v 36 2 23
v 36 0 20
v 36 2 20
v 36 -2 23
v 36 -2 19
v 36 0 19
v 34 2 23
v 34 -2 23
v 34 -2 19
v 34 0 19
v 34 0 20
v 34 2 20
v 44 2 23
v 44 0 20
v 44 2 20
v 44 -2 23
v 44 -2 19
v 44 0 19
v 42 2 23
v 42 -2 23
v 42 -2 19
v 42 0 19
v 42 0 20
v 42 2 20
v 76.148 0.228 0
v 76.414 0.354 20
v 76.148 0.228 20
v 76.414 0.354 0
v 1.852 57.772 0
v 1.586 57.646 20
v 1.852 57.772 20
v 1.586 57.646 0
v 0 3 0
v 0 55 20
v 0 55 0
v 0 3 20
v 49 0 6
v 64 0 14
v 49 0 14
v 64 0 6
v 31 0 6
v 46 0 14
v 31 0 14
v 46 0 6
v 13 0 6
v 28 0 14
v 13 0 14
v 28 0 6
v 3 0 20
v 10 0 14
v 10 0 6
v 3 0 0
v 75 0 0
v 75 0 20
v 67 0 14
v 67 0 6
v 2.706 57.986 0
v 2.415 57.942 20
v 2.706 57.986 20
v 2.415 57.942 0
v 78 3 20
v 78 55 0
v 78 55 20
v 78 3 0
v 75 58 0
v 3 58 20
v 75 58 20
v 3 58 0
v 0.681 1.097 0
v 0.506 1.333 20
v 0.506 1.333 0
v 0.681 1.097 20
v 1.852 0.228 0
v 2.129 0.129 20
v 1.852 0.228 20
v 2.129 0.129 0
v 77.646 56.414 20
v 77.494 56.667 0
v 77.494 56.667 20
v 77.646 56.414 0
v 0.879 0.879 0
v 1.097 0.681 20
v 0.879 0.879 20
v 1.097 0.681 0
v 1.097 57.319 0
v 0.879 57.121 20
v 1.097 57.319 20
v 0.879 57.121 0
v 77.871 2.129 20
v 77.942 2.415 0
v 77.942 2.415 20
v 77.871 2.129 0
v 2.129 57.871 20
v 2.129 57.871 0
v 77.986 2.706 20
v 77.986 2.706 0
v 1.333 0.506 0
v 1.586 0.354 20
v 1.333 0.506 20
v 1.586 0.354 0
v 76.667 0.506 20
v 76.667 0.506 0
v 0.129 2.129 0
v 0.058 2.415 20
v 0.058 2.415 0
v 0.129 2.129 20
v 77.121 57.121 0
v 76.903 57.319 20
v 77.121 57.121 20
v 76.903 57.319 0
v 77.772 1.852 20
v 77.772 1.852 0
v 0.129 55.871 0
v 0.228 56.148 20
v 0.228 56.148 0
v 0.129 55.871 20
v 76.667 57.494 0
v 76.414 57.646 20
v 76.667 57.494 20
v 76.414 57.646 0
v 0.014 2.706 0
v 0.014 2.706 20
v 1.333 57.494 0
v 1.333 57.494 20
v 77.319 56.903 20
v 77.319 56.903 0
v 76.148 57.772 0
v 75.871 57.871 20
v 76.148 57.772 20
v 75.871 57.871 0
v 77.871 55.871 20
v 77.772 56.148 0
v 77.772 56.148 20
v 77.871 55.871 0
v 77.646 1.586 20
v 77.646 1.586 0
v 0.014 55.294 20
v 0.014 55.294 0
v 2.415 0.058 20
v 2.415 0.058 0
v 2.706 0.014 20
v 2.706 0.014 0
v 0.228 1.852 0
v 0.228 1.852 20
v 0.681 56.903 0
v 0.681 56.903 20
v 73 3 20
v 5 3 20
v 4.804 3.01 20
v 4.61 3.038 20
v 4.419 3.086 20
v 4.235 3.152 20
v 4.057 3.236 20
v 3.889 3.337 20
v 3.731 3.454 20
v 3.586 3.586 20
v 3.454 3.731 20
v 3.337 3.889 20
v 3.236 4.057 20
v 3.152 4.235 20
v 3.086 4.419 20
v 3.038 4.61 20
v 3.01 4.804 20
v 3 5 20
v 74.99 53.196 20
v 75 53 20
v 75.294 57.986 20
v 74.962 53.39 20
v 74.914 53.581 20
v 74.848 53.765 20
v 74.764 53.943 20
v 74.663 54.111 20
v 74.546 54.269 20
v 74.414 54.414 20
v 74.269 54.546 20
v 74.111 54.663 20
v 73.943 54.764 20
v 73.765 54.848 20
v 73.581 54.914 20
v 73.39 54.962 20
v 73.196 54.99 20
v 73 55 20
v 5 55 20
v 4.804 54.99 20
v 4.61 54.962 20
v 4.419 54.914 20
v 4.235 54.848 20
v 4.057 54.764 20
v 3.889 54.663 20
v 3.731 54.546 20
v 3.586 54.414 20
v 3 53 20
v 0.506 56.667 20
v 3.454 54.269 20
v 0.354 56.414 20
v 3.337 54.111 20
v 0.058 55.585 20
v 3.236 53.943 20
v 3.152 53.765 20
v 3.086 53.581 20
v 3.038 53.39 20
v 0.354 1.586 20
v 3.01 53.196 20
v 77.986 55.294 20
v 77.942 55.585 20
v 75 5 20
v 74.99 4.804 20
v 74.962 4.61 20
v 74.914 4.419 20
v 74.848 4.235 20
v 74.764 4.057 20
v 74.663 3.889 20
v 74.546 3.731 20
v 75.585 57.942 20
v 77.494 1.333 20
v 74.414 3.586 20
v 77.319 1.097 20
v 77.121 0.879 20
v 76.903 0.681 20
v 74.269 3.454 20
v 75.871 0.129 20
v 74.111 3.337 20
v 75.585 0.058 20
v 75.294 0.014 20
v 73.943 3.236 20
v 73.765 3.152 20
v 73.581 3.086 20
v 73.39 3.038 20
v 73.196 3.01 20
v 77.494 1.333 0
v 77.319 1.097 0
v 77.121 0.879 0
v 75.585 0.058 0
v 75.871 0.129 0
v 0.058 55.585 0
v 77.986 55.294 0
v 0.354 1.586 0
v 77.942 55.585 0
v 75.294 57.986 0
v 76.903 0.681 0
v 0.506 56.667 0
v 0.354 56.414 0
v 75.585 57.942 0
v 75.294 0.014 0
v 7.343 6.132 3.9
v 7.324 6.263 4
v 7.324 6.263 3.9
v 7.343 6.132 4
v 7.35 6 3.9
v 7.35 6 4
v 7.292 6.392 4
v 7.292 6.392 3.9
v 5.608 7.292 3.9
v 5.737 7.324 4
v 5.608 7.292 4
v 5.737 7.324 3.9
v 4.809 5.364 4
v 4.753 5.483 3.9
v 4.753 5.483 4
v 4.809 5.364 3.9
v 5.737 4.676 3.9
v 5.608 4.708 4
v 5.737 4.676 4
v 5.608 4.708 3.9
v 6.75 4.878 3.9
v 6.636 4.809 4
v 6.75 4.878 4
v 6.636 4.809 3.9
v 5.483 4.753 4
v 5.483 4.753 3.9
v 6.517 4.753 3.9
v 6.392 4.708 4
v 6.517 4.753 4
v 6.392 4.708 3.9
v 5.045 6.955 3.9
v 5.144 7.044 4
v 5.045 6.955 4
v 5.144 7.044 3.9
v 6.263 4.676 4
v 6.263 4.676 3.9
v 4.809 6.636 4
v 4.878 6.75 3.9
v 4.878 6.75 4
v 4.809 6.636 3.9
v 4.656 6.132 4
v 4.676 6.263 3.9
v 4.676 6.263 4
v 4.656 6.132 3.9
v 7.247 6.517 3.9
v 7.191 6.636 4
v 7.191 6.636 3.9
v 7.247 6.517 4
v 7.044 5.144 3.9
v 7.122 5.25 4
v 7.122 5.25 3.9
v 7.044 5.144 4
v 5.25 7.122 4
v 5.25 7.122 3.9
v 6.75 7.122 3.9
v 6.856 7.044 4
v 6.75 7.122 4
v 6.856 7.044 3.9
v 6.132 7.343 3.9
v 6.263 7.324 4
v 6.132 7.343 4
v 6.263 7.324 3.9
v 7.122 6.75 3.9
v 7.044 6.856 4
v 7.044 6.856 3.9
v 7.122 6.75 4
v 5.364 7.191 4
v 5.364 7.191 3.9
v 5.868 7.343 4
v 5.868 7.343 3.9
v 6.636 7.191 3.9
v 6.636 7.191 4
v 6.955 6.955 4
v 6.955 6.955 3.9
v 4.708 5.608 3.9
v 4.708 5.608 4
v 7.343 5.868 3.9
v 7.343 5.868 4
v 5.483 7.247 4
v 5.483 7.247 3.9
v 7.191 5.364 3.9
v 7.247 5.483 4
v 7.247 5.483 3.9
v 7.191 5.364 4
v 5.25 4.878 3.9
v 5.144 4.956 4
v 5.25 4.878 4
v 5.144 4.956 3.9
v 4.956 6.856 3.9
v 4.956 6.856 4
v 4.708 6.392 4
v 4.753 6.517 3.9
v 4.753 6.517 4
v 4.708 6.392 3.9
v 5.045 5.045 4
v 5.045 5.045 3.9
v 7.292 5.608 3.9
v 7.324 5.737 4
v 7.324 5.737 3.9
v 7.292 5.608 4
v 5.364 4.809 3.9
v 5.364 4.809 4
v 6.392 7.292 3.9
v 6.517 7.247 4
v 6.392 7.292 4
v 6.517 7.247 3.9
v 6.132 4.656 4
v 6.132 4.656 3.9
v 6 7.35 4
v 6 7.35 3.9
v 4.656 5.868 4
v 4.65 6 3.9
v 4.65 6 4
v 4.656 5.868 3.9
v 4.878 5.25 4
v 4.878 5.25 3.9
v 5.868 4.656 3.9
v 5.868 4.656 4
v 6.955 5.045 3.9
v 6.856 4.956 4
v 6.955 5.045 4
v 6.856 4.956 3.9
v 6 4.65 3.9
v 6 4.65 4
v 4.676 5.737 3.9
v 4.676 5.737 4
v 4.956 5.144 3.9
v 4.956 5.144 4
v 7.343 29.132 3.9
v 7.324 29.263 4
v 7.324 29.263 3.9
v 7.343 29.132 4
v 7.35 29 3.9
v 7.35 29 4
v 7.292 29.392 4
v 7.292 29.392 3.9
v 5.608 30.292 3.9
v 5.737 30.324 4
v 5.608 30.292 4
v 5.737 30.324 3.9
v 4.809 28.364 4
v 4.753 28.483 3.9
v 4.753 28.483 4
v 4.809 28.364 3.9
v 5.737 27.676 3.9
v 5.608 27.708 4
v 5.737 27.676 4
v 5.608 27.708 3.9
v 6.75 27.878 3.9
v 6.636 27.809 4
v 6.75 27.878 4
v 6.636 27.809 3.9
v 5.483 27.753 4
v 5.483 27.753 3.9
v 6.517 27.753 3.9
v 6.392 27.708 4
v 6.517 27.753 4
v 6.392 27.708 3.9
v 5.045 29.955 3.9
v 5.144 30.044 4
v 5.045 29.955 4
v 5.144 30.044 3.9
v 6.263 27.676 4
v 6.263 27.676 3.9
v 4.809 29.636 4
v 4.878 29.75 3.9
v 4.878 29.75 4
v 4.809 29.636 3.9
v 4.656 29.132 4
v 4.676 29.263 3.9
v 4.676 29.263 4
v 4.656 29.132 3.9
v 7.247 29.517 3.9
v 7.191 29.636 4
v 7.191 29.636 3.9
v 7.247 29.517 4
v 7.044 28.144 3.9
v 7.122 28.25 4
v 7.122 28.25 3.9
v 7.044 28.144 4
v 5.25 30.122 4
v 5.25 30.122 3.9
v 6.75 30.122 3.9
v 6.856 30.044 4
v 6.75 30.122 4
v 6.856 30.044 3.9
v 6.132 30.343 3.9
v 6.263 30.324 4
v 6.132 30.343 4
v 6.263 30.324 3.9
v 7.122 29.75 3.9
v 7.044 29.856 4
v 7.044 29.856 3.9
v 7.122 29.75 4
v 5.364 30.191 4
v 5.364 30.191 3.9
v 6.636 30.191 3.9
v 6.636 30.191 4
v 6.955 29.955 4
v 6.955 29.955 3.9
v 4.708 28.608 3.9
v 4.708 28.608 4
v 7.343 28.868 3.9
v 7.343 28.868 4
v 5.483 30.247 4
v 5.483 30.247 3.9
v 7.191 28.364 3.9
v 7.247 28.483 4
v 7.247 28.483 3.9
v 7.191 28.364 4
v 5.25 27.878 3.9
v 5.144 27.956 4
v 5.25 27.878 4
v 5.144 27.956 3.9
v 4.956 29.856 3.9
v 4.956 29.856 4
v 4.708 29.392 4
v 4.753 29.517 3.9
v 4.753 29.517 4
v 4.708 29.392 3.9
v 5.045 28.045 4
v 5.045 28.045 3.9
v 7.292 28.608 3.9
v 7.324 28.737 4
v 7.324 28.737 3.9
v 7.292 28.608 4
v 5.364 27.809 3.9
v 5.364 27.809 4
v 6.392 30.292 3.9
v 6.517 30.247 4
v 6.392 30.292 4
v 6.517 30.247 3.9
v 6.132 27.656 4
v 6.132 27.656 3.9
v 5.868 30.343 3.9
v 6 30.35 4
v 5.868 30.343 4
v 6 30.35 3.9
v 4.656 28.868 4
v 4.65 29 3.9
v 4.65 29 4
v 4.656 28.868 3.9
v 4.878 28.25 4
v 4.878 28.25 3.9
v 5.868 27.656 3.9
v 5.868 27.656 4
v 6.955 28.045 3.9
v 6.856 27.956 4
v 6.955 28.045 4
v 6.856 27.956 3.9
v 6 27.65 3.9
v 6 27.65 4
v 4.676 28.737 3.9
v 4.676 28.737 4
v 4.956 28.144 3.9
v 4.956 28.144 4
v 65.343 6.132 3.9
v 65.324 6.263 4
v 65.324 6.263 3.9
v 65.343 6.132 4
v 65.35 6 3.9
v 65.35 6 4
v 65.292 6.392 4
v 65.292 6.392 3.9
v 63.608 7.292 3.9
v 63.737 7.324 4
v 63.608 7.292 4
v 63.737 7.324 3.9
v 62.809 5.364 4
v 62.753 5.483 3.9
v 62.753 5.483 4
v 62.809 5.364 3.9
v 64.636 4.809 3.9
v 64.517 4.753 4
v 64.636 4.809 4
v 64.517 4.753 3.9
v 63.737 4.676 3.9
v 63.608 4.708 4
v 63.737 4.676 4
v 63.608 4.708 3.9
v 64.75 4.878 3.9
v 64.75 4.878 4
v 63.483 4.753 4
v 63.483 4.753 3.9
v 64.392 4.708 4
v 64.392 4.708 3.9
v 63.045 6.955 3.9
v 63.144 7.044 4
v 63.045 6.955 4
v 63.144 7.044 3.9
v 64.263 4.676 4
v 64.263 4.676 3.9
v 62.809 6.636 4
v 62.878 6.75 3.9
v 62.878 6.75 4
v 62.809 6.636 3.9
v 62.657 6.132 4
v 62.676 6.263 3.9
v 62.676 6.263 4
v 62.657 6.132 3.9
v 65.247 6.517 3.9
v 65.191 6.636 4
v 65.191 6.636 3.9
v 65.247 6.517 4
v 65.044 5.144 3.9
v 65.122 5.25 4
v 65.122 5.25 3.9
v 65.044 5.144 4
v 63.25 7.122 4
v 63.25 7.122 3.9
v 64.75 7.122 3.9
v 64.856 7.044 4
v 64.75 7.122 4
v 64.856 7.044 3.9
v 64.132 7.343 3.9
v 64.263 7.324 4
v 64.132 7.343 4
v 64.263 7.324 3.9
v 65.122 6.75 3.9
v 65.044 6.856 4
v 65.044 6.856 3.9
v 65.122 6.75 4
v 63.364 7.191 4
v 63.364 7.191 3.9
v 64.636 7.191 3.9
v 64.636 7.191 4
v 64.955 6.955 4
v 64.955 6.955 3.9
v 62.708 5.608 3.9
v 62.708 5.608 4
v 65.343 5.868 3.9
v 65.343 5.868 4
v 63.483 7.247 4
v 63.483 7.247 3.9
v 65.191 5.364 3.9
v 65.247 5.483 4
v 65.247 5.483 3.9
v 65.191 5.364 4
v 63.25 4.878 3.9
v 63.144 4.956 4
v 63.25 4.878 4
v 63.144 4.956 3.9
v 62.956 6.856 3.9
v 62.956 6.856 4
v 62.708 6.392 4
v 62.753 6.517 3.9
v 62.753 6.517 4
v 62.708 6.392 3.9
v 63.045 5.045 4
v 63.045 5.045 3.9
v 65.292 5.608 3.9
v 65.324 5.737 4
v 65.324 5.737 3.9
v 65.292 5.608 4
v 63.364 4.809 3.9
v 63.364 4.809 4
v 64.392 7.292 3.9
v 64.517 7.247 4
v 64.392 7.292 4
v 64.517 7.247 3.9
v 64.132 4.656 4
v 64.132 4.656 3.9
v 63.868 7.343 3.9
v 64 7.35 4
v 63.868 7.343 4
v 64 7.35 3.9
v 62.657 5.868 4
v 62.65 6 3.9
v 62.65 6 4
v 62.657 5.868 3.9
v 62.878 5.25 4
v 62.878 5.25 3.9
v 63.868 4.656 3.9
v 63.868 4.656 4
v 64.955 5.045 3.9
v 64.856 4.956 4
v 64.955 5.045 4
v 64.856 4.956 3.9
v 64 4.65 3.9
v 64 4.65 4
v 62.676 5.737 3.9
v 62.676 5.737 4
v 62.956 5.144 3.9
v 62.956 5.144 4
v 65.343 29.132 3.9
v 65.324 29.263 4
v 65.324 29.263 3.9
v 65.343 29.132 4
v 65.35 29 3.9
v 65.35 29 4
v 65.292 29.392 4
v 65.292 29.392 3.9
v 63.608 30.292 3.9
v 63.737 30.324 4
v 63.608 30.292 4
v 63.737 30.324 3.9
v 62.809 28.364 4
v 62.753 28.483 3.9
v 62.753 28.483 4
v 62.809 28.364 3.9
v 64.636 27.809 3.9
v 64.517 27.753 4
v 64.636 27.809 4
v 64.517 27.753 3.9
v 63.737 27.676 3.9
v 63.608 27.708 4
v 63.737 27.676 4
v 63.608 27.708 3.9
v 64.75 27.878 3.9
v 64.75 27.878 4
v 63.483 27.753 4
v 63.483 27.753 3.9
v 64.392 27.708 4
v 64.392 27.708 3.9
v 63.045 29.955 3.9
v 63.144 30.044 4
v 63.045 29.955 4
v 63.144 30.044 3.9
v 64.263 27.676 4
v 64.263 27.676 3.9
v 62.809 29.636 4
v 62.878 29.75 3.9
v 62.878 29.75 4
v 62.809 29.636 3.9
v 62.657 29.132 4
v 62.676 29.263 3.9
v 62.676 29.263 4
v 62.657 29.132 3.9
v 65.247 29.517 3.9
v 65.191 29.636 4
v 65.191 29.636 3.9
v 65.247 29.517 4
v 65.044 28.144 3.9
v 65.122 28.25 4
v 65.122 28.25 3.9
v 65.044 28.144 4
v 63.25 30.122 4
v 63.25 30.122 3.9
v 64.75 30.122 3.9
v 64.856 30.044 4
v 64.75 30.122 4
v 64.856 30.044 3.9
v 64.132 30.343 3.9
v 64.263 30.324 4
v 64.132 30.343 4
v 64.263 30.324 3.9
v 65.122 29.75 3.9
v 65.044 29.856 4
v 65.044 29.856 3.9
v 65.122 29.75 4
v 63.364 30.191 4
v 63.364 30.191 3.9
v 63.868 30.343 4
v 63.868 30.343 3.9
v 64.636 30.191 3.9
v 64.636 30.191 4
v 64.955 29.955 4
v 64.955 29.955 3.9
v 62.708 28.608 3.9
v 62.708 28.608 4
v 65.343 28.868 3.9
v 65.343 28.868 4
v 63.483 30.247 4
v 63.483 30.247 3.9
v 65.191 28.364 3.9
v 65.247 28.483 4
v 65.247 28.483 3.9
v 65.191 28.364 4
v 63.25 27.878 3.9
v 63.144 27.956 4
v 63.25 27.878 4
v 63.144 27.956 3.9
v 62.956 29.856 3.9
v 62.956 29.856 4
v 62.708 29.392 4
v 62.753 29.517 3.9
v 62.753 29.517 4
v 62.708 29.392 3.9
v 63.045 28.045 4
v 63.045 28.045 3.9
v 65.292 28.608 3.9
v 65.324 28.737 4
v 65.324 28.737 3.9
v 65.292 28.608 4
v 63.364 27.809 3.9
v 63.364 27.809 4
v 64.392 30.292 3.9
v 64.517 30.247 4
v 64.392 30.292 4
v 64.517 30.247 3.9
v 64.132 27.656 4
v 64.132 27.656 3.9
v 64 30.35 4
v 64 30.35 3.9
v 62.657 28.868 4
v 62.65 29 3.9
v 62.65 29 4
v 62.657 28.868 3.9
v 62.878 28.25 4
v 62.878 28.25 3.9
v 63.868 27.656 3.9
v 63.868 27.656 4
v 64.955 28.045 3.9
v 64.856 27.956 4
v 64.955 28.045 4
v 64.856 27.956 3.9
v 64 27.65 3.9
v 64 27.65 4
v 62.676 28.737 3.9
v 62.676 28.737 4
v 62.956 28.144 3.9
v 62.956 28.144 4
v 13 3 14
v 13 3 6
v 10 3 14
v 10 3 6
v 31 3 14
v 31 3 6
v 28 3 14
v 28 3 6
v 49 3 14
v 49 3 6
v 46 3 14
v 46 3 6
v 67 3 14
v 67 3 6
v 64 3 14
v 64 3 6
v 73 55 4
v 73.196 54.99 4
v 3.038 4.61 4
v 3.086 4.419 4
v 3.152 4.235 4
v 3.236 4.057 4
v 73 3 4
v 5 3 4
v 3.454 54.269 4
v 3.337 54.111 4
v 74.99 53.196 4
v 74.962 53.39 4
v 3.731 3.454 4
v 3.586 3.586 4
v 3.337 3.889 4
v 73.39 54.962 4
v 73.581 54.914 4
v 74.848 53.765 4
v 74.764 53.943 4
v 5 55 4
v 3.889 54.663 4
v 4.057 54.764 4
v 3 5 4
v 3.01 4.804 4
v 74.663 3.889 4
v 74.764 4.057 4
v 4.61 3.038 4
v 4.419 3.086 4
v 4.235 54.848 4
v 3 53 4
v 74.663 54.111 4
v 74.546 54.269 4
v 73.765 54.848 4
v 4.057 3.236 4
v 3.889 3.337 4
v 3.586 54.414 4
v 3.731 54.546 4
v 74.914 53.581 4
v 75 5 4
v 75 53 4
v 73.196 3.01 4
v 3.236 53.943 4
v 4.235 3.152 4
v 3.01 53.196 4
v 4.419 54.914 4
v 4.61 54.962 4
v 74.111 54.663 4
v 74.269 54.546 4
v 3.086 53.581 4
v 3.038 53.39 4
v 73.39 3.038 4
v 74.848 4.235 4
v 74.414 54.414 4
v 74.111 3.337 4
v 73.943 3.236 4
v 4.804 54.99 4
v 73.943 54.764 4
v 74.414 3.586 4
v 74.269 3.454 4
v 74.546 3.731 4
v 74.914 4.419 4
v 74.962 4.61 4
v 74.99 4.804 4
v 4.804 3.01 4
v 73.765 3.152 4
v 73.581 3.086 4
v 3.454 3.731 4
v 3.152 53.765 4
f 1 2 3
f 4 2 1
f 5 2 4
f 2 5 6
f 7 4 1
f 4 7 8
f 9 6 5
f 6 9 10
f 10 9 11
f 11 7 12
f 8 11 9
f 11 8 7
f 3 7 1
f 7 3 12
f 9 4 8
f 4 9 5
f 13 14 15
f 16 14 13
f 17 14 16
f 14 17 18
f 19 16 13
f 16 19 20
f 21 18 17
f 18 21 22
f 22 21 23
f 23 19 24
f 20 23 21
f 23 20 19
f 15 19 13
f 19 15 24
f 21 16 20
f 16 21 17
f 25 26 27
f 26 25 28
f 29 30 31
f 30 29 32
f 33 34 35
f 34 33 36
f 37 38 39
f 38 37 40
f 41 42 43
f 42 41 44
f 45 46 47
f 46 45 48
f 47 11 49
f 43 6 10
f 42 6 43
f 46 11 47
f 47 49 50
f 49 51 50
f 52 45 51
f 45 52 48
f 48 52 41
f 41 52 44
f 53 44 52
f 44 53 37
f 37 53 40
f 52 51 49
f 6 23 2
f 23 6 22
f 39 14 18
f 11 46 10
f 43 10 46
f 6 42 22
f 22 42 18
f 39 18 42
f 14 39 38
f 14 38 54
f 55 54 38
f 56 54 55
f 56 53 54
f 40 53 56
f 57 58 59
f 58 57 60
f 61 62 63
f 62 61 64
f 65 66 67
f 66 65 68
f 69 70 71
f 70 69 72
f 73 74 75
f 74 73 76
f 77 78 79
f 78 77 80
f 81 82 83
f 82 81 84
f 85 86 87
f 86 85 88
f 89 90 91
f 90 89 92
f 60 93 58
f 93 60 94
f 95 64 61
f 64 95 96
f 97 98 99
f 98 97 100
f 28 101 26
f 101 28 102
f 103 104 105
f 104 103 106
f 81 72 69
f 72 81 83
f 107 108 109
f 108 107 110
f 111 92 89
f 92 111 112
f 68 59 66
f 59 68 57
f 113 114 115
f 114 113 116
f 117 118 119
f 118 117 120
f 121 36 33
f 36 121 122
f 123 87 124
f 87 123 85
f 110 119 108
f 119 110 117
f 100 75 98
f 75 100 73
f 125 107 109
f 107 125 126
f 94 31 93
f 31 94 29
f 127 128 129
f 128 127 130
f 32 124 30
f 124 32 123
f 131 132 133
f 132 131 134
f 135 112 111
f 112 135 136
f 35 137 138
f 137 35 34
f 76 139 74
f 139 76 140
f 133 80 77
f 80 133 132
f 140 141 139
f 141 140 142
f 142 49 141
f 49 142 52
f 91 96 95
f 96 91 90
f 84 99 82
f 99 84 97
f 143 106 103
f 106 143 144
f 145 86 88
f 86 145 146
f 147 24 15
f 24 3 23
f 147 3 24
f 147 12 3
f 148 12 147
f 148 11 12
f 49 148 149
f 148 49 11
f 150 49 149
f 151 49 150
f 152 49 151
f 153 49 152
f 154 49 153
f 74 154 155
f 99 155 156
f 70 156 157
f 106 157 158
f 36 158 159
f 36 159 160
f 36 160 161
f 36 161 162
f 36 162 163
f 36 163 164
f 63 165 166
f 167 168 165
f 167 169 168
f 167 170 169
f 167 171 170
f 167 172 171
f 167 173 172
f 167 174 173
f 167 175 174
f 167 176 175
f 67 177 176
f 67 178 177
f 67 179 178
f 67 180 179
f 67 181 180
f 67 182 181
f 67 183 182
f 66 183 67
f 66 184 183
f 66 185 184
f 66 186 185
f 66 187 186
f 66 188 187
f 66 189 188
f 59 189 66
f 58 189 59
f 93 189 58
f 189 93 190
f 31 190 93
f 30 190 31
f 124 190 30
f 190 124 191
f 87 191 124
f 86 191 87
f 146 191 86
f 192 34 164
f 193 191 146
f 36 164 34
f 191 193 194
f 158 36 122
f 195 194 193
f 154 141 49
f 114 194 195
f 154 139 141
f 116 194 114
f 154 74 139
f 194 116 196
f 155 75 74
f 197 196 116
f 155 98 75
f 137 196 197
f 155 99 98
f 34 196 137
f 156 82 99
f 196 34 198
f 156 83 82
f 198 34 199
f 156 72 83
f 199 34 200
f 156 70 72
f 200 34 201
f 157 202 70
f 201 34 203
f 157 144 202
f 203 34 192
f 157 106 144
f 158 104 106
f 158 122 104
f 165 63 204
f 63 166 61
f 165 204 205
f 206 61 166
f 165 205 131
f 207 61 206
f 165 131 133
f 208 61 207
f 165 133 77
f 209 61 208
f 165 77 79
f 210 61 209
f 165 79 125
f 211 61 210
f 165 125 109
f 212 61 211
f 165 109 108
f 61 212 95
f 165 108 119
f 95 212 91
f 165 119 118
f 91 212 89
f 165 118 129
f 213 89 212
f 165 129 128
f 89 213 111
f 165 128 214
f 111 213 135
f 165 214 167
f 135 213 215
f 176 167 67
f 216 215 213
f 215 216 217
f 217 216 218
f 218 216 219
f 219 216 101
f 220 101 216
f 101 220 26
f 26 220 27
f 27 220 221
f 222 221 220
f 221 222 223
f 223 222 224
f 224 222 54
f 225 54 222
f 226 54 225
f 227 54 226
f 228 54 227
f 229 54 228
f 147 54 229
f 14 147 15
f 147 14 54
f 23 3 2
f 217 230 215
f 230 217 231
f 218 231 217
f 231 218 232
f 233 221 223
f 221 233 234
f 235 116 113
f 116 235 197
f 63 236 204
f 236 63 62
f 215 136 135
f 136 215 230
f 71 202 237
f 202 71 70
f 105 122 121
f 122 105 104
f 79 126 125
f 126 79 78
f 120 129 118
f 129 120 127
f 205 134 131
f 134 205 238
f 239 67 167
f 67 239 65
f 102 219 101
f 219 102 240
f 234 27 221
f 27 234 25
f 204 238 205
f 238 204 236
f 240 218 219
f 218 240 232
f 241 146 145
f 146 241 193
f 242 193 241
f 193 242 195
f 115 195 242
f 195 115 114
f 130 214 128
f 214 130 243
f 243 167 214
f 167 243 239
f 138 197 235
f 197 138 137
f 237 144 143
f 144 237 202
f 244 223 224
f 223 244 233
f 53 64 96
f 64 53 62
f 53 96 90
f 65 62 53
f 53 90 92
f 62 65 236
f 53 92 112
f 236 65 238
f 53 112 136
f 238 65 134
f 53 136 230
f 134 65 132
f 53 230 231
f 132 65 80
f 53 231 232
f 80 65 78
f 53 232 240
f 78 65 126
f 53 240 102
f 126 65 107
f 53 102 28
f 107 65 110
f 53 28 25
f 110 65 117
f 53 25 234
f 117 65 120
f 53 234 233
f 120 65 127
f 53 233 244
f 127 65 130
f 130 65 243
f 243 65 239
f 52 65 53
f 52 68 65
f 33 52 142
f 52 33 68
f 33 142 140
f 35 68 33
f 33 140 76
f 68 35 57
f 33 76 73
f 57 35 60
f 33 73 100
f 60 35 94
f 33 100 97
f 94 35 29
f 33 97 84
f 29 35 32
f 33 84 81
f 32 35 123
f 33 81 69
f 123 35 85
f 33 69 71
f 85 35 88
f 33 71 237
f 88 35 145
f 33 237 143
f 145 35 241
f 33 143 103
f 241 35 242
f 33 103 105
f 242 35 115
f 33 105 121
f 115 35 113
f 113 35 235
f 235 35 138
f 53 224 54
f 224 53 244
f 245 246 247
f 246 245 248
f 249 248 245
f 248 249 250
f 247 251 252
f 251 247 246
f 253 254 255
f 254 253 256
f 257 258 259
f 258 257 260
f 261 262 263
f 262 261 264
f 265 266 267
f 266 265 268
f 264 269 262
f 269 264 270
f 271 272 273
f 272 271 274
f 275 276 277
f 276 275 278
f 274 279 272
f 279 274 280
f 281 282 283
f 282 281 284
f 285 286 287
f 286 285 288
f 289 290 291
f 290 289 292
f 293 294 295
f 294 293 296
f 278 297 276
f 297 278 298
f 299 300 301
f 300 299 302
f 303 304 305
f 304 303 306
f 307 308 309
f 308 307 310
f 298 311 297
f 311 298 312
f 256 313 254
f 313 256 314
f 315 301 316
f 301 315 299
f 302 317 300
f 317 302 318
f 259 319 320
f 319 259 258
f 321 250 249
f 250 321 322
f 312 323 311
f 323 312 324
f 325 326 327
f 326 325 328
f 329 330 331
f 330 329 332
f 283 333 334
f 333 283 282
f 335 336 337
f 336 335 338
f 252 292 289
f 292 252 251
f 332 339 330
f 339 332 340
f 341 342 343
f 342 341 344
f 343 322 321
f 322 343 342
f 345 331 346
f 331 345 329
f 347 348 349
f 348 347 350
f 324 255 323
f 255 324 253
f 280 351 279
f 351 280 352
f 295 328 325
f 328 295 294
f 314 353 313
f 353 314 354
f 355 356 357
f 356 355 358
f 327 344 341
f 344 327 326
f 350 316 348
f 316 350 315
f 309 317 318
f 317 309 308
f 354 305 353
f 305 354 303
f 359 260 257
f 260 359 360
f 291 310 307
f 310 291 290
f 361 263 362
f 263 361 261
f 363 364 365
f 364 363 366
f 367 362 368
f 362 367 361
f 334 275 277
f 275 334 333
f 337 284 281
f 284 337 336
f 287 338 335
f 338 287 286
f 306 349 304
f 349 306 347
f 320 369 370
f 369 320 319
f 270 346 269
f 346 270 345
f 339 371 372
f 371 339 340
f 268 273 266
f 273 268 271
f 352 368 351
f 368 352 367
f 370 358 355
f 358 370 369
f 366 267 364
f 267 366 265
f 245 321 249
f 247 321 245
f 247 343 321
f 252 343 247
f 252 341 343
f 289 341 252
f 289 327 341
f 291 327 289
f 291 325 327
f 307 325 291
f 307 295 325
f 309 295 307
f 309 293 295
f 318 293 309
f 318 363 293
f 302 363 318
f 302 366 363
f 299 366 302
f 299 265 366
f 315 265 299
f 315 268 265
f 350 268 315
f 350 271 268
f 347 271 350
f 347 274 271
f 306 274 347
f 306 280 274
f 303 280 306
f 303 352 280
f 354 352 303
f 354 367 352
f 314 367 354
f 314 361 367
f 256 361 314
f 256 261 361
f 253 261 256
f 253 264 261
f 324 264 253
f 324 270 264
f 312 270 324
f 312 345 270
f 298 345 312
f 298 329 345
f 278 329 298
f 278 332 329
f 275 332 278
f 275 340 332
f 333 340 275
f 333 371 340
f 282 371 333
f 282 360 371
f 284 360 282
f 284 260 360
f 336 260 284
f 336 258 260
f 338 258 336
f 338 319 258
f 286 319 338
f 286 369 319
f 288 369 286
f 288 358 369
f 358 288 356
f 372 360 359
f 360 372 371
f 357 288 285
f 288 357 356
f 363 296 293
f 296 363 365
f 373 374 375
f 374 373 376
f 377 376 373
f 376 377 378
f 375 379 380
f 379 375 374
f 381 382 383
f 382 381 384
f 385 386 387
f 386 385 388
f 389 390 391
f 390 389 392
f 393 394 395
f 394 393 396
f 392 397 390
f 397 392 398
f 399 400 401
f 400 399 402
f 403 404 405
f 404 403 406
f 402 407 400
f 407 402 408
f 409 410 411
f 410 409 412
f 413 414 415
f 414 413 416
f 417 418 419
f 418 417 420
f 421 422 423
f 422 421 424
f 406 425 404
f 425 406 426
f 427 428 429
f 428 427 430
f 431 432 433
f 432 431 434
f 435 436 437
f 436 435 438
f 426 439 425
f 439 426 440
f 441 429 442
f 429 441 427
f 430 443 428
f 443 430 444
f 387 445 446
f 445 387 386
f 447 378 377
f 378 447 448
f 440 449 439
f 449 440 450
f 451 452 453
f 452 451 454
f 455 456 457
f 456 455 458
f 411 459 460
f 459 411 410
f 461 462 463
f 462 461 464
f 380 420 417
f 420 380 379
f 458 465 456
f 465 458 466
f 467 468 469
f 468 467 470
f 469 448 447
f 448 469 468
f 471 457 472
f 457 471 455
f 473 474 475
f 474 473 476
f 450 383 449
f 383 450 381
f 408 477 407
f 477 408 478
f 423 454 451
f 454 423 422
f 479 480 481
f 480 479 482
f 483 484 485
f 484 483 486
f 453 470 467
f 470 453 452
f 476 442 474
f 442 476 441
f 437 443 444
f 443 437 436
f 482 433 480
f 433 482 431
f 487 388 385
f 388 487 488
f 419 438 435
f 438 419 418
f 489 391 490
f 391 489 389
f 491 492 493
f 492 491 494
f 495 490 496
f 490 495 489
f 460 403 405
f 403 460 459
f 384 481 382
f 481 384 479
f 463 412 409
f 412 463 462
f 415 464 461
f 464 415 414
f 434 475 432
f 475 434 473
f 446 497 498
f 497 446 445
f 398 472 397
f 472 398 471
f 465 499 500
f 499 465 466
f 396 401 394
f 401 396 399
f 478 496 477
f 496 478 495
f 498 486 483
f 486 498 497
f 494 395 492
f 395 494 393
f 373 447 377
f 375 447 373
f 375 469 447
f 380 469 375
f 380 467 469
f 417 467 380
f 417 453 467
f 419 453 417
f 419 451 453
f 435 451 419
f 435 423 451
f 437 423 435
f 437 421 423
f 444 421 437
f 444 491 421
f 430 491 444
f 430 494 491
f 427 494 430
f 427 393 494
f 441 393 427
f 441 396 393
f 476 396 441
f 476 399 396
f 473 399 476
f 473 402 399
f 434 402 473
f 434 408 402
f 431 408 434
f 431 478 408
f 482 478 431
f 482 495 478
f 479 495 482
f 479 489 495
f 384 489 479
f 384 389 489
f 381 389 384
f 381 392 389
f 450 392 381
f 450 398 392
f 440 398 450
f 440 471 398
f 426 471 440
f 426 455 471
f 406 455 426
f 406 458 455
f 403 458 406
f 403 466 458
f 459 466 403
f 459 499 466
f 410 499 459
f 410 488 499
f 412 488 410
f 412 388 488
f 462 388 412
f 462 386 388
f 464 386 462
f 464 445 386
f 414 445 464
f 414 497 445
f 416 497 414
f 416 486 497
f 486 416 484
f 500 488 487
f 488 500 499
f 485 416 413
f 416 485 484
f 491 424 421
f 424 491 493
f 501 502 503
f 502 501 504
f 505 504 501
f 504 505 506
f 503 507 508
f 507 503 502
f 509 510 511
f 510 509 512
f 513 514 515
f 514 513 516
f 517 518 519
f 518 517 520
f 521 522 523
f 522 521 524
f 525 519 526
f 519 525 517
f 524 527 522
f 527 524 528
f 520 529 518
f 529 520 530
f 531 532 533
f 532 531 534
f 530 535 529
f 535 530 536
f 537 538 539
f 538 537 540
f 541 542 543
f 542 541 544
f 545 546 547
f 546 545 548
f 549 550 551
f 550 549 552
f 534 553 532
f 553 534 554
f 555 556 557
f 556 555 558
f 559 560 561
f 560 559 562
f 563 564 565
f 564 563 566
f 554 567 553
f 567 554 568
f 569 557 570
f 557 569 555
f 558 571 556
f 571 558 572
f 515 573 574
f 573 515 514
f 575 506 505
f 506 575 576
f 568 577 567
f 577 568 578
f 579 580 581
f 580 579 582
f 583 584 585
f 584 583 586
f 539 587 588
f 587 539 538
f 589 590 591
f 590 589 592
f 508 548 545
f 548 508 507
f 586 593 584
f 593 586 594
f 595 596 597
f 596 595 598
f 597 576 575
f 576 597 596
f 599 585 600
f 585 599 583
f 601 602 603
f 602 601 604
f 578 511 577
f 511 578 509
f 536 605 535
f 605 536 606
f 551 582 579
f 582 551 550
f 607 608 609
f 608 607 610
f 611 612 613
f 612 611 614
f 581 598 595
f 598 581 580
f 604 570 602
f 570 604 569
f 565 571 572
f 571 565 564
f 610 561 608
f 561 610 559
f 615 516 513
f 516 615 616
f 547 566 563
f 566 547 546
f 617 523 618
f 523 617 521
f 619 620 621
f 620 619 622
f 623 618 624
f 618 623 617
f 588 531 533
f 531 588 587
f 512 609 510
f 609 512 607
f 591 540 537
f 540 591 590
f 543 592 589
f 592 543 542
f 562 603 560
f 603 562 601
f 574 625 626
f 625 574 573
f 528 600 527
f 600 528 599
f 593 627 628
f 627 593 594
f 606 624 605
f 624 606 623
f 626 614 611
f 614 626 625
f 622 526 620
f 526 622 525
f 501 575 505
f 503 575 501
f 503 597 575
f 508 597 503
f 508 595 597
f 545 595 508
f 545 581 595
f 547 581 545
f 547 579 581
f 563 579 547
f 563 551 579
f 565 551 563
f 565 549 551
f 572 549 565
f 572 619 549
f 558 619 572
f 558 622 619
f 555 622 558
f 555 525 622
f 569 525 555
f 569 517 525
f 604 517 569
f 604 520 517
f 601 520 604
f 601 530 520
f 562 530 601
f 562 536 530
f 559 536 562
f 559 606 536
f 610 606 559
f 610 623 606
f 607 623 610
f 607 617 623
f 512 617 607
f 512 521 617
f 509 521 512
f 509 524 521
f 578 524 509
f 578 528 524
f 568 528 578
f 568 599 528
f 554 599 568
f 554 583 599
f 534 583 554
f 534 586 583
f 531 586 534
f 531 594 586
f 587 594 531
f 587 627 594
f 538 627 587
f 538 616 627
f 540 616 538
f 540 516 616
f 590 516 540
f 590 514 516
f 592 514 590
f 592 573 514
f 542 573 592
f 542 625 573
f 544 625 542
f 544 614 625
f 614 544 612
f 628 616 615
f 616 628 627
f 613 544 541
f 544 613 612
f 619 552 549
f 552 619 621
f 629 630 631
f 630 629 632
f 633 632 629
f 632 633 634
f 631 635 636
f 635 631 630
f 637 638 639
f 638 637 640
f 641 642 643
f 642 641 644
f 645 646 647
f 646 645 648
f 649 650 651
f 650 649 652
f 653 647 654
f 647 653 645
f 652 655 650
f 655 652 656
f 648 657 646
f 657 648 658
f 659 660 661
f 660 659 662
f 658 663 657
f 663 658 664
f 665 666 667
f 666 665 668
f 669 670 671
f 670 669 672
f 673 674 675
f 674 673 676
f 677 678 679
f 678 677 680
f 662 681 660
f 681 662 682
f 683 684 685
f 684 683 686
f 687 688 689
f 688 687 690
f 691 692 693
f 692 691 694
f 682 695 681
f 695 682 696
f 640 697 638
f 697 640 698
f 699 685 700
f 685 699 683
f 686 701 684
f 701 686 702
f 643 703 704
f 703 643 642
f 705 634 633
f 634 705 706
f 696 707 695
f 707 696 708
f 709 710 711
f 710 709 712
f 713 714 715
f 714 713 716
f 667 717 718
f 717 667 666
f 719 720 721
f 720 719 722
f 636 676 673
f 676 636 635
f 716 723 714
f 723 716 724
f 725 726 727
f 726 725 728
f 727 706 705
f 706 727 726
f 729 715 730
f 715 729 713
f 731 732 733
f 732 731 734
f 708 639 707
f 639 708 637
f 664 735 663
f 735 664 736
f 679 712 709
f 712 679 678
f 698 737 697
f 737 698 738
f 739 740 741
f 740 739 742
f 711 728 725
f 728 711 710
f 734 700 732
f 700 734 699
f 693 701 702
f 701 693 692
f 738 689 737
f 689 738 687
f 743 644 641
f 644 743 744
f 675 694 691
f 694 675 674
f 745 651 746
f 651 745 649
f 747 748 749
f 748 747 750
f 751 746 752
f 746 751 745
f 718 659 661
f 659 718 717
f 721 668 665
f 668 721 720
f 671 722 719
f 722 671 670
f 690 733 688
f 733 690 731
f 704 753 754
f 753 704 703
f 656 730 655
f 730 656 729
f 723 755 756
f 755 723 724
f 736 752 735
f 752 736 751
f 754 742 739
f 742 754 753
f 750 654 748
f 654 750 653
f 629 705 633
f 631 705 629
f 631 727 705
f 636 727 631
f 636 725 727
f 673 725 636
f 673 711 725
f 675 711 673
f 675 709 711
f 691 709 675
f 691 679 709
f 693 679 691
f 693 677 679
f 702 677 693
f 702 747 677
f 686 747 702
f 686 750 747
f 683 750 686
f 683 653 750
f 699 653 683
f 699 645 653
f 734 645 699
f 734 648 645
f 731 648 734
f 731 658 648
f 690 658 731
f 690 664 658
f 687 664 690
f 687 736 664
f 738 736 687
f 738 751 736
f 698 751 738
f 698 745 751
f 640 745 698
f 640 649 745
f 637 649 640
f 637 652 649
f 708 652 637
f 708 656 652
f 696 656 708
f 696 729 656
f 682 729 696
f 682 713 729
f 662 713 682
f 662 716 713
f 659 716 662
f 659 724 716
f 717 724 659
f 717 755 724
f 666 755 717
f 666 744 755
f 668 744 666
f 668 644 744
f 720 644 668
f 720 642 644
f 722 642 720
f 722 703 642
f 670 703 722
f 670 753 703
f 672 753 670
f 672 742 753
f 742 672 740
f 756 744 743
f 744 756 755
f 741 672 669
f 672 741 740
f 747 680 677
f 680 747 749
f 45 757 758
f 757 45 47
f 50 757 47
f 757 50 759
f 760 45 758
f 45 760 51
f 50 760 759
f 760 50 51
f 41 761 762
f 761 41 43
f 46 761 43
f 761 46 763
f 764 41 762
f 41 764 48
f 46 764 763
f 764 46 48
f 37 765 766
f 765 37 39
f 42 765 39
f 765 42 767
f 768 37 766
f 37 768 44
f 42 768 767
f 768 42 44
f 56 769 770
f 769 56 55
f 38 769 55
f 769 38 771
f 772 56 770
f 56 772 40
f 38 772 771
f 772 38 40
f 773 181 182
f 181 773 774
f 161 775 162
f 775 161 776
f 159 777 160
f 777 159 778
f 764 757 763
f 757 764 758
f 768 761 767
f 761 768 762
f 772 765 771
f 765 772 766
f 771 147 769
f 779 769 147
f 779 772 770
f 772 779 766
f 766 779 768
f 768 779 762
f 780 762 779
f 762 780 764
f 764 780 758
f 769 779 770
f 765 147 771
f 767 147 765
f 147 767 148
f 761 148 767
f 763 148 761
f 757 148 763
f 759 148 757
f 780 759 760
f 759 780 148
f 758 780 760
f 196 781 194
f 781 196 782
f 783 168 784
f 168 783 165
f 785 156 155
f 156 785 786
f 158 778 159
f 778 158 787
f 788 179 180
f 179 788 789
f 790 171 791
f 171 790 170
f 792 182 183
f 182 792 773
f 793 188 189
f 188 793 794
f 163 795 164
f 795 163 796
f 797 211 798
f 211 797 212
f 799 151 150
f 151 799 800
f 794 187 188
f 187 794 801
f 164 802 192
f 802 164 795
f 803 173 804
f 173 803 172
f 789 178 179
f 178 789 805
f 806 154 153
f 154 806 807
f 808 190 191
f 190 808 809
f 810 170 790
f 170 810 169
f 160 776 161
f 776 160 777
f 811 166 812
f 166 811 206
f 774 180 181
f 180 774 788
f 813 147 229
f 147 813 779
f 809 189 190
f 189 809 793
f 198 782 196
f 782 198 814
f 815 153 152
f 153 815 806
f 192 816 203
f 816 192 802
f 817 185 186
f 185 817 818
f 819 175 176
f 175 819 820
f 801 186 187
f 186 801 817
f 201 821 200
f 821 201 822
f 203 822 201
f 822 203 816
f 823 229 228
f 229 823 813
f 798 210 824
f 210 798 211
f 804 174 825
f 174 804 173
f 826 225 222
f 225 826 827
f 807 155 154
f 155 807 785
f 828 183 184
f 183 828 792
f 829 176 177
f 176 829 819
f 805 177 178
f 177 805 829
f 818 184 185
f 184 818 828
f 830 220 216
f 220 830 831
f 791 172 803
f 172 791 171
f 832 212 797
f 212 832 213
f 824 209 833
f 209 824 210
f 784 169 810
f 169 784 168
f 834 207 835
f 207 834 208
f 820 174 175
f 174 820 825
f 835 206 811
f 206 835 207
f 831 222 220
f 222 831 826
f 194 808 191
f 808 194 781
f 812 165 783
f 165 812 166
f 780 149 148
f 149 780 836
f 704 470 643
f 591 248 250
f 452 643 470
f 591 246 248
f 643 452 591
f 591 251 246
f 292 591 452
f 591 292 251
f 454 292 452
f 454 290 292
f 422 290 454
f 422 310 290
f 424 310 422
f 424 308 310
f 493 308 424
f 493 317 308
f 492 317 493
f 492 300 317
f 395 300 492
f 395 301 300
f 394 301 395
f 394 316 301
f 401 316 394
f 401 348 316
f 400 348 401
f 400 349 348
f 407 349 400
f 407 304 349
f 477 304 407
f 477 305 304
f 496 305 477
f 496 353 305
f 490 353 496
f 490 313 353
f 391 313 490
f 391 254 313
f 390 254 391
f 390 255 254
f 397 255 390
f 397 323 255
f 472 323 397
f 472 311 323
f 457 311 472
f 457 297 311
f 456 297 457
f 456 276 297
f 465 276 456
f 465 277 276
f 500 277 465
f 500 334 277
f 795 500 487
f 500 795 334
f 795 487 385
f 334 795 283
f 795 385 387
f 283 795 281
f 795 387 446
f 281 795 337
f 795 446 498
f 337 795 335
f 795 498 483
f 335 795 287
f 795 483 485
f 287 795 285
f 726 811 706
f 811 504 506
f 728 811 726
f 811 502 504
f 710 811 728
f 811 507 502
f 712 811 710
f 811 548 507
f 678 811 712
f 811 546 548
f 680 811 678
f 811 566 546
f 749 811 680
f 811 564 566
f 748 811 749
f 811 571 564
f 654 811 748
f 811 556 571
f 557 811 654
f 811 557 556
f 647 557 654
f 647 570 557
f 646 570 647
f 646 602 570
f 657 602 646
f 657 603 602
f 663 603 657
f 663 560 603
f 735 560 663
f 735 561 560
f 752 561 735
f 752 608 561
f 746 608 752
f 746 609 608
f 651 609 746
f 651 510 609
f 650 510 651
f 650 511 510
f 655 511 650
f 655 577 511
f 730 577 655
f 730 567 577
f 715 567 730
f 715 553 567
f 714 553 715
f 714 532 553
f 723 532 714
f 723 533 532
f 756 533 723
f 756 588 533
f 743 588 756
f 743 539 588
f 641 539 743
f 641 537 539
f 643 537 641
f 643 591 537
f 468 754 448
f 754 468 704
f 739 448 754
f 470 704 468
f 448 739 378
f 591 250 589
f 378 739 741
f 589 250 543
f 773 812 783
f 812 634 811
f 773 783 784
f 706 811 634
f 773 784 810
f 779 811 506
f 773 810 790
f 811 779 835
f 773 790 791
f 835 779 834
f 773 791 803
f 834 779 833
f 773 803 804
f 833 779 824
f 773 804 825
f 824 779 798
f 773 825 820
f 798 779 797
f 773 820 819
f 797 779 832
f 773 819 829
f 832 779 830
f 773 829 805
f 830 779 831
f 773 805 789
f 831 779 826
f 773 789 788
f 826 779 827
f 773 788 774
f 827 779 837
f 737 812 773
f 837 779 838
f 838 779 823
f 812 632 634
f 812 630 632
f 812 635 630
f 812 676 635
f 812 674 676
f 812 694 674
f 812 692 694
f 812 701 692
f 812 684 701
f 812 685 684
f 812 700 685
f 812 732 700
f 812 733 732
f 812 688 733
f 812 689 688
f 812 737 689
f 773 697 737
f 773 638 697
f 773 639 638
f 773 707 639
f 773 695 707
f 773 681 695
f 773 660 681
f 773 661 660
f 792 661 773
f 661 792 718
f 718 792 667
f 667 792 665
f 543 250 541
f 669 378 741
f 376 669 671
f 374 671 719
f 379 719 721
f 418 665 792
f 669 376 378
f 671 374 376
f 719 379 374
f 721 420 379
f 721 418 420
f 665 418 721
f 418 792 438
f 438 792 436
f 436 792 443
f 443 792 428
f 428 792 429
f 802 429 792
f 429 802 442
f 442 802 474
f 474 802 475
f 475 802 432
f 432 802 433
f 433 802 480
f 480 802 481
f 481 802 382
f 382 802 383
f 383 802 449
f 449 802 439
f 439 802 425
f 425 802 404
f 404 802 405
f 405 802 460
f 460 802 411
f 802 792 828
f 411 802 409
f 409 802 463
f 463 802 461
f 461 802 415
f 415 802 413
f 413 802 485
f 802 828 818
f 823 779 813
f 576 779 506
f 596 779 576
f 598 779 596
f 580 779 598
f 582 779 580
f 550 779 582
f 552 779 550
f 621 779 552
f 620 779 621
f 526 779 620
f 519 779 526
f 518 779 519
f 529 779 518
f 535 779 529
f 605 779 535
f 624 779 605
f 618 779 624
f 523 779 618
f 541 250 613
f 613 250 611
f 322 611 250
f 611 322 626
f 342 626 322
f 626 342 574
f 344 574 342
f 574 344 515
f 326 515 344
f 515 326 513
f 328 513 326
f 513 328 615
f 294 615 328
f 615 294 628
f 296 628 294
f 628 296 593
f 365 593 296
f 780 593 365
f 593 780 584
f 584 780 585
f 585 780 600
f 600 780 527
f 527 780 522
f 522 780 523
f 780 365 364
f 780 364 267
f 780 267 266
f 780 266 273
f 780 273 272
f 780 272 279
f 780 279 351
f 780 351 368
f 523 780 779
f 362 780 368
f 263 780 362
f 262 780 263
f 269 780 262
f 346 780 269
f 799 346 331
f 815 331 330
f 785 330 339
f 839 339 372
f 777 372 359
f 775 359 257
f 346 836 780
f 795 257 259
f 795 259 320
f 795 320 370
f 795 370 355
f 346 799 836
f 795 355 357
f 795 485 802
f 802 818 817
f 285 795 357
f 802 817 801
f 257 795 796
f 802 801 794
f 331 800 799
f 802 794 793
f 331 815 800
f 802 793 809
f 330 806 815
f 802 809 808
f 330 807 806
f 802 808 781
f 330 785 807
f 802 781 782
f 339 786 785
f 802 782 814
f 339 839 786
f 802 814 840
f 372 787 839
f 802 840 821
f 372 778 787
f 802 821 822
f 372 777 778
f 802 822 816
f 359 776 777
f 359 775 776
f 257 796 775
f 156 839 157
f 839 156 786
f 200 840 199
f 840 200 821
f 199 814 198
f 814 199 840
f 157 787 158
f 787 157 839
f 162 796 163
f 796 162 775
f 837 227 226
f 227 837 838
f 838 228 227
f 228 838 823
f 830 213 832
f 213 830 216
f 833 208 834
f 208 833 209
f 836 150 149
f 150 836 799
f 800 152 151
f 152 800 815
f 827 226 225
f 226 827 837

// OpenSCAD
// file: params.scad
// Cat Feeder 5000 — Shared Parameters & Common Modules
// Include this file first in all part files: include <params.scad>

// ===== DIMENSIONS =====
WALL = 3;                // Standard wall thickness (mm)
THIN_WALL = 2.5;         // Thin walls (antenna arch, etc.)
FLOOR = 4;               // Base floor thickness
INSERT_BORE = 4.7;       // M3 heat-set insert pocket bore
M3_CLEAR = 3.4;          // M3 clearance hole
UNIT_W = 160;            // Main body width
UNIT_D = 240;            // Main body depth
UNIT_H = 160;            // Main body height
GATE_W = 118;            // Gate flap width
GATE_H = 90;             // Gate flap height
GATE_T = 3;              // Gate flap thickness
GATE_ROD_D = 3.2;        // Gate hinge rod diameter
ARCH_SPAN = 160;         // Antenna arch left-to-right span
ARCH_H = 70;             // Antenna arch height
ARCH_D = 40;             // Antenna arch depth (front-to-back)
COIL_CH_W = 16;          // Coil channel width
COIL_CH_D = 5;           // Coil channel depth
SERVO_W = 23;            // SG90 servo width
SERVO_D = 12.5;          // SG90 servo depth
SERVO_H = 30;            // SG90 servo height
SERVO_EAR_SPAN = 28;     // SG90 servo ear spacing
TOLERANCE = 0.1;         // General fit tolerance

// ===== RENDER QUALITY =====
$fn = 64;                // Circle resolution (smooth curves)

// ===== COLORS =====
COL_RFID = [0.8, 0.2, 0.2, 0.8];      // Red — RFID antenna arch
COL_TPU = [0.4, 0.7, 0.3, 0.8];       // Green — TPU flexible parts
COL_GATE = [0.2, 0.5, 0.8, 0.8];      // Blue — Gate mechanism
COL_BODY = [0.6, 0.6, 0.6, 0.8];      // Gray — Main body structure

// ===== COMMON MODULES =====

// M3 heat-set insert pocket (bore hole for pressed insert)
module m3_insert(h = 8) {
    cylinder(d = INSERT_BORE, h = h);
}

// M3 clearance hole (for bolt pass-through)
module m3_clear(h = 8) {
    cylinder(d = M3_CLEAR, h = h);
}

// Fillet box: rectangular box with filleted corners
// w, d, h = width, depth, height; r = corner radius
module fillet_box(w, d, h, r = 2) {
    hull() {
        translate([r, r, 0])
            cylinder(r = r, h = h);
        translate([w - r, r, 0])
            cylinder(r = r, h = h);
        translate([r, d - r, 0])
            cylinder(r = r, h = h);
        translate([w - r, d - r, 0])
            cylinder(r = r, h = h);
    }
}

// Boss: raised circular pad with M3 pocket
// Useful for internal reinforcement at bolt points
module boss(d = 10, h = 4, pocket = true) {
    difference() {
        cylinder(d = d, h = h);
        if (pocket)
            translate([0, 0, -0.1])
                m3_clear(h = h + 0.2);
    }
}
// main file
// Cat Feeder 5000 — Part 07: Electronics Tray
// Snap-in tray holding Pi Zero 2W, Arduino Nano, and wiring.
// Print: PETG, 0.25mm layers, 30% infill, no supports

include <params.scad>

color(COL_BODY) electronics_tray();

module electronics_tray() {
    TW = 78; TD = 58; TH = 20;
    PI_W = 65; PI_D = 30; PI_H = 6;
    ARD_W = 45; ARD_D = 18; ARD_H = 8;
    SNAP_T = 2; SNAP_H = 4;

    difference() {
        union() {
            // Base tray
            fillet_box(TW, TD, TH, r=3);
            // Snap clips (2×, short sides center)
            for (x = [TW/2 - 5, TW/2 + 3])
                translate([x, -SNAP_T, TH - 1])
                    cube([SNAP_T, SNAP_T + 2, SNAP_H]);
        }
        // Hollow tray interior
        translate([WALL, WALL, FLOOR])
            fillet_box(TW - 2*WALL, TD - 2*WALL, TH, r=2);

        // Pi Zero 2W pocket (left side)
        translate([WALL + 2, WALL + 2, FLOOR])
            cube([PI_W, PI_D, PI_H]);
        // Pi mounting pegs recesses (4× M2.5 holes, 58×23mm bolt pattern)
        for (x=[WALL+3, WALL+3+58]) for (y=[WALL+3, WALL+3+23])
            translate([x, y, FLOOR - 0.1]) cylinder(d=2.7, h=4);

        // Arduino Nano pocket (right lower)
        translate([TW - WALL - ARD_W - 2, WALL + 2, FLOOR])
            cube([ARD_W, ARD_D, ARD_H]);

        // Wire channel slots (3mm × 1.5mm every 25mm along long sides)
        for (i=[0:3])
            translate([10 + i*18, -0.1, FLOOR + 2])
                cube([3, WALL + 0.2, 8]);

        // Ventilation holes above Pi (Ø3mm, 6×)
        for (x=[15,30,45]) for (y=[15,25])
            translate([x, y, TH - FLOOR - 0.1])
                cylinder(d=3, h=FLOOR + 0.2);
    }
}
